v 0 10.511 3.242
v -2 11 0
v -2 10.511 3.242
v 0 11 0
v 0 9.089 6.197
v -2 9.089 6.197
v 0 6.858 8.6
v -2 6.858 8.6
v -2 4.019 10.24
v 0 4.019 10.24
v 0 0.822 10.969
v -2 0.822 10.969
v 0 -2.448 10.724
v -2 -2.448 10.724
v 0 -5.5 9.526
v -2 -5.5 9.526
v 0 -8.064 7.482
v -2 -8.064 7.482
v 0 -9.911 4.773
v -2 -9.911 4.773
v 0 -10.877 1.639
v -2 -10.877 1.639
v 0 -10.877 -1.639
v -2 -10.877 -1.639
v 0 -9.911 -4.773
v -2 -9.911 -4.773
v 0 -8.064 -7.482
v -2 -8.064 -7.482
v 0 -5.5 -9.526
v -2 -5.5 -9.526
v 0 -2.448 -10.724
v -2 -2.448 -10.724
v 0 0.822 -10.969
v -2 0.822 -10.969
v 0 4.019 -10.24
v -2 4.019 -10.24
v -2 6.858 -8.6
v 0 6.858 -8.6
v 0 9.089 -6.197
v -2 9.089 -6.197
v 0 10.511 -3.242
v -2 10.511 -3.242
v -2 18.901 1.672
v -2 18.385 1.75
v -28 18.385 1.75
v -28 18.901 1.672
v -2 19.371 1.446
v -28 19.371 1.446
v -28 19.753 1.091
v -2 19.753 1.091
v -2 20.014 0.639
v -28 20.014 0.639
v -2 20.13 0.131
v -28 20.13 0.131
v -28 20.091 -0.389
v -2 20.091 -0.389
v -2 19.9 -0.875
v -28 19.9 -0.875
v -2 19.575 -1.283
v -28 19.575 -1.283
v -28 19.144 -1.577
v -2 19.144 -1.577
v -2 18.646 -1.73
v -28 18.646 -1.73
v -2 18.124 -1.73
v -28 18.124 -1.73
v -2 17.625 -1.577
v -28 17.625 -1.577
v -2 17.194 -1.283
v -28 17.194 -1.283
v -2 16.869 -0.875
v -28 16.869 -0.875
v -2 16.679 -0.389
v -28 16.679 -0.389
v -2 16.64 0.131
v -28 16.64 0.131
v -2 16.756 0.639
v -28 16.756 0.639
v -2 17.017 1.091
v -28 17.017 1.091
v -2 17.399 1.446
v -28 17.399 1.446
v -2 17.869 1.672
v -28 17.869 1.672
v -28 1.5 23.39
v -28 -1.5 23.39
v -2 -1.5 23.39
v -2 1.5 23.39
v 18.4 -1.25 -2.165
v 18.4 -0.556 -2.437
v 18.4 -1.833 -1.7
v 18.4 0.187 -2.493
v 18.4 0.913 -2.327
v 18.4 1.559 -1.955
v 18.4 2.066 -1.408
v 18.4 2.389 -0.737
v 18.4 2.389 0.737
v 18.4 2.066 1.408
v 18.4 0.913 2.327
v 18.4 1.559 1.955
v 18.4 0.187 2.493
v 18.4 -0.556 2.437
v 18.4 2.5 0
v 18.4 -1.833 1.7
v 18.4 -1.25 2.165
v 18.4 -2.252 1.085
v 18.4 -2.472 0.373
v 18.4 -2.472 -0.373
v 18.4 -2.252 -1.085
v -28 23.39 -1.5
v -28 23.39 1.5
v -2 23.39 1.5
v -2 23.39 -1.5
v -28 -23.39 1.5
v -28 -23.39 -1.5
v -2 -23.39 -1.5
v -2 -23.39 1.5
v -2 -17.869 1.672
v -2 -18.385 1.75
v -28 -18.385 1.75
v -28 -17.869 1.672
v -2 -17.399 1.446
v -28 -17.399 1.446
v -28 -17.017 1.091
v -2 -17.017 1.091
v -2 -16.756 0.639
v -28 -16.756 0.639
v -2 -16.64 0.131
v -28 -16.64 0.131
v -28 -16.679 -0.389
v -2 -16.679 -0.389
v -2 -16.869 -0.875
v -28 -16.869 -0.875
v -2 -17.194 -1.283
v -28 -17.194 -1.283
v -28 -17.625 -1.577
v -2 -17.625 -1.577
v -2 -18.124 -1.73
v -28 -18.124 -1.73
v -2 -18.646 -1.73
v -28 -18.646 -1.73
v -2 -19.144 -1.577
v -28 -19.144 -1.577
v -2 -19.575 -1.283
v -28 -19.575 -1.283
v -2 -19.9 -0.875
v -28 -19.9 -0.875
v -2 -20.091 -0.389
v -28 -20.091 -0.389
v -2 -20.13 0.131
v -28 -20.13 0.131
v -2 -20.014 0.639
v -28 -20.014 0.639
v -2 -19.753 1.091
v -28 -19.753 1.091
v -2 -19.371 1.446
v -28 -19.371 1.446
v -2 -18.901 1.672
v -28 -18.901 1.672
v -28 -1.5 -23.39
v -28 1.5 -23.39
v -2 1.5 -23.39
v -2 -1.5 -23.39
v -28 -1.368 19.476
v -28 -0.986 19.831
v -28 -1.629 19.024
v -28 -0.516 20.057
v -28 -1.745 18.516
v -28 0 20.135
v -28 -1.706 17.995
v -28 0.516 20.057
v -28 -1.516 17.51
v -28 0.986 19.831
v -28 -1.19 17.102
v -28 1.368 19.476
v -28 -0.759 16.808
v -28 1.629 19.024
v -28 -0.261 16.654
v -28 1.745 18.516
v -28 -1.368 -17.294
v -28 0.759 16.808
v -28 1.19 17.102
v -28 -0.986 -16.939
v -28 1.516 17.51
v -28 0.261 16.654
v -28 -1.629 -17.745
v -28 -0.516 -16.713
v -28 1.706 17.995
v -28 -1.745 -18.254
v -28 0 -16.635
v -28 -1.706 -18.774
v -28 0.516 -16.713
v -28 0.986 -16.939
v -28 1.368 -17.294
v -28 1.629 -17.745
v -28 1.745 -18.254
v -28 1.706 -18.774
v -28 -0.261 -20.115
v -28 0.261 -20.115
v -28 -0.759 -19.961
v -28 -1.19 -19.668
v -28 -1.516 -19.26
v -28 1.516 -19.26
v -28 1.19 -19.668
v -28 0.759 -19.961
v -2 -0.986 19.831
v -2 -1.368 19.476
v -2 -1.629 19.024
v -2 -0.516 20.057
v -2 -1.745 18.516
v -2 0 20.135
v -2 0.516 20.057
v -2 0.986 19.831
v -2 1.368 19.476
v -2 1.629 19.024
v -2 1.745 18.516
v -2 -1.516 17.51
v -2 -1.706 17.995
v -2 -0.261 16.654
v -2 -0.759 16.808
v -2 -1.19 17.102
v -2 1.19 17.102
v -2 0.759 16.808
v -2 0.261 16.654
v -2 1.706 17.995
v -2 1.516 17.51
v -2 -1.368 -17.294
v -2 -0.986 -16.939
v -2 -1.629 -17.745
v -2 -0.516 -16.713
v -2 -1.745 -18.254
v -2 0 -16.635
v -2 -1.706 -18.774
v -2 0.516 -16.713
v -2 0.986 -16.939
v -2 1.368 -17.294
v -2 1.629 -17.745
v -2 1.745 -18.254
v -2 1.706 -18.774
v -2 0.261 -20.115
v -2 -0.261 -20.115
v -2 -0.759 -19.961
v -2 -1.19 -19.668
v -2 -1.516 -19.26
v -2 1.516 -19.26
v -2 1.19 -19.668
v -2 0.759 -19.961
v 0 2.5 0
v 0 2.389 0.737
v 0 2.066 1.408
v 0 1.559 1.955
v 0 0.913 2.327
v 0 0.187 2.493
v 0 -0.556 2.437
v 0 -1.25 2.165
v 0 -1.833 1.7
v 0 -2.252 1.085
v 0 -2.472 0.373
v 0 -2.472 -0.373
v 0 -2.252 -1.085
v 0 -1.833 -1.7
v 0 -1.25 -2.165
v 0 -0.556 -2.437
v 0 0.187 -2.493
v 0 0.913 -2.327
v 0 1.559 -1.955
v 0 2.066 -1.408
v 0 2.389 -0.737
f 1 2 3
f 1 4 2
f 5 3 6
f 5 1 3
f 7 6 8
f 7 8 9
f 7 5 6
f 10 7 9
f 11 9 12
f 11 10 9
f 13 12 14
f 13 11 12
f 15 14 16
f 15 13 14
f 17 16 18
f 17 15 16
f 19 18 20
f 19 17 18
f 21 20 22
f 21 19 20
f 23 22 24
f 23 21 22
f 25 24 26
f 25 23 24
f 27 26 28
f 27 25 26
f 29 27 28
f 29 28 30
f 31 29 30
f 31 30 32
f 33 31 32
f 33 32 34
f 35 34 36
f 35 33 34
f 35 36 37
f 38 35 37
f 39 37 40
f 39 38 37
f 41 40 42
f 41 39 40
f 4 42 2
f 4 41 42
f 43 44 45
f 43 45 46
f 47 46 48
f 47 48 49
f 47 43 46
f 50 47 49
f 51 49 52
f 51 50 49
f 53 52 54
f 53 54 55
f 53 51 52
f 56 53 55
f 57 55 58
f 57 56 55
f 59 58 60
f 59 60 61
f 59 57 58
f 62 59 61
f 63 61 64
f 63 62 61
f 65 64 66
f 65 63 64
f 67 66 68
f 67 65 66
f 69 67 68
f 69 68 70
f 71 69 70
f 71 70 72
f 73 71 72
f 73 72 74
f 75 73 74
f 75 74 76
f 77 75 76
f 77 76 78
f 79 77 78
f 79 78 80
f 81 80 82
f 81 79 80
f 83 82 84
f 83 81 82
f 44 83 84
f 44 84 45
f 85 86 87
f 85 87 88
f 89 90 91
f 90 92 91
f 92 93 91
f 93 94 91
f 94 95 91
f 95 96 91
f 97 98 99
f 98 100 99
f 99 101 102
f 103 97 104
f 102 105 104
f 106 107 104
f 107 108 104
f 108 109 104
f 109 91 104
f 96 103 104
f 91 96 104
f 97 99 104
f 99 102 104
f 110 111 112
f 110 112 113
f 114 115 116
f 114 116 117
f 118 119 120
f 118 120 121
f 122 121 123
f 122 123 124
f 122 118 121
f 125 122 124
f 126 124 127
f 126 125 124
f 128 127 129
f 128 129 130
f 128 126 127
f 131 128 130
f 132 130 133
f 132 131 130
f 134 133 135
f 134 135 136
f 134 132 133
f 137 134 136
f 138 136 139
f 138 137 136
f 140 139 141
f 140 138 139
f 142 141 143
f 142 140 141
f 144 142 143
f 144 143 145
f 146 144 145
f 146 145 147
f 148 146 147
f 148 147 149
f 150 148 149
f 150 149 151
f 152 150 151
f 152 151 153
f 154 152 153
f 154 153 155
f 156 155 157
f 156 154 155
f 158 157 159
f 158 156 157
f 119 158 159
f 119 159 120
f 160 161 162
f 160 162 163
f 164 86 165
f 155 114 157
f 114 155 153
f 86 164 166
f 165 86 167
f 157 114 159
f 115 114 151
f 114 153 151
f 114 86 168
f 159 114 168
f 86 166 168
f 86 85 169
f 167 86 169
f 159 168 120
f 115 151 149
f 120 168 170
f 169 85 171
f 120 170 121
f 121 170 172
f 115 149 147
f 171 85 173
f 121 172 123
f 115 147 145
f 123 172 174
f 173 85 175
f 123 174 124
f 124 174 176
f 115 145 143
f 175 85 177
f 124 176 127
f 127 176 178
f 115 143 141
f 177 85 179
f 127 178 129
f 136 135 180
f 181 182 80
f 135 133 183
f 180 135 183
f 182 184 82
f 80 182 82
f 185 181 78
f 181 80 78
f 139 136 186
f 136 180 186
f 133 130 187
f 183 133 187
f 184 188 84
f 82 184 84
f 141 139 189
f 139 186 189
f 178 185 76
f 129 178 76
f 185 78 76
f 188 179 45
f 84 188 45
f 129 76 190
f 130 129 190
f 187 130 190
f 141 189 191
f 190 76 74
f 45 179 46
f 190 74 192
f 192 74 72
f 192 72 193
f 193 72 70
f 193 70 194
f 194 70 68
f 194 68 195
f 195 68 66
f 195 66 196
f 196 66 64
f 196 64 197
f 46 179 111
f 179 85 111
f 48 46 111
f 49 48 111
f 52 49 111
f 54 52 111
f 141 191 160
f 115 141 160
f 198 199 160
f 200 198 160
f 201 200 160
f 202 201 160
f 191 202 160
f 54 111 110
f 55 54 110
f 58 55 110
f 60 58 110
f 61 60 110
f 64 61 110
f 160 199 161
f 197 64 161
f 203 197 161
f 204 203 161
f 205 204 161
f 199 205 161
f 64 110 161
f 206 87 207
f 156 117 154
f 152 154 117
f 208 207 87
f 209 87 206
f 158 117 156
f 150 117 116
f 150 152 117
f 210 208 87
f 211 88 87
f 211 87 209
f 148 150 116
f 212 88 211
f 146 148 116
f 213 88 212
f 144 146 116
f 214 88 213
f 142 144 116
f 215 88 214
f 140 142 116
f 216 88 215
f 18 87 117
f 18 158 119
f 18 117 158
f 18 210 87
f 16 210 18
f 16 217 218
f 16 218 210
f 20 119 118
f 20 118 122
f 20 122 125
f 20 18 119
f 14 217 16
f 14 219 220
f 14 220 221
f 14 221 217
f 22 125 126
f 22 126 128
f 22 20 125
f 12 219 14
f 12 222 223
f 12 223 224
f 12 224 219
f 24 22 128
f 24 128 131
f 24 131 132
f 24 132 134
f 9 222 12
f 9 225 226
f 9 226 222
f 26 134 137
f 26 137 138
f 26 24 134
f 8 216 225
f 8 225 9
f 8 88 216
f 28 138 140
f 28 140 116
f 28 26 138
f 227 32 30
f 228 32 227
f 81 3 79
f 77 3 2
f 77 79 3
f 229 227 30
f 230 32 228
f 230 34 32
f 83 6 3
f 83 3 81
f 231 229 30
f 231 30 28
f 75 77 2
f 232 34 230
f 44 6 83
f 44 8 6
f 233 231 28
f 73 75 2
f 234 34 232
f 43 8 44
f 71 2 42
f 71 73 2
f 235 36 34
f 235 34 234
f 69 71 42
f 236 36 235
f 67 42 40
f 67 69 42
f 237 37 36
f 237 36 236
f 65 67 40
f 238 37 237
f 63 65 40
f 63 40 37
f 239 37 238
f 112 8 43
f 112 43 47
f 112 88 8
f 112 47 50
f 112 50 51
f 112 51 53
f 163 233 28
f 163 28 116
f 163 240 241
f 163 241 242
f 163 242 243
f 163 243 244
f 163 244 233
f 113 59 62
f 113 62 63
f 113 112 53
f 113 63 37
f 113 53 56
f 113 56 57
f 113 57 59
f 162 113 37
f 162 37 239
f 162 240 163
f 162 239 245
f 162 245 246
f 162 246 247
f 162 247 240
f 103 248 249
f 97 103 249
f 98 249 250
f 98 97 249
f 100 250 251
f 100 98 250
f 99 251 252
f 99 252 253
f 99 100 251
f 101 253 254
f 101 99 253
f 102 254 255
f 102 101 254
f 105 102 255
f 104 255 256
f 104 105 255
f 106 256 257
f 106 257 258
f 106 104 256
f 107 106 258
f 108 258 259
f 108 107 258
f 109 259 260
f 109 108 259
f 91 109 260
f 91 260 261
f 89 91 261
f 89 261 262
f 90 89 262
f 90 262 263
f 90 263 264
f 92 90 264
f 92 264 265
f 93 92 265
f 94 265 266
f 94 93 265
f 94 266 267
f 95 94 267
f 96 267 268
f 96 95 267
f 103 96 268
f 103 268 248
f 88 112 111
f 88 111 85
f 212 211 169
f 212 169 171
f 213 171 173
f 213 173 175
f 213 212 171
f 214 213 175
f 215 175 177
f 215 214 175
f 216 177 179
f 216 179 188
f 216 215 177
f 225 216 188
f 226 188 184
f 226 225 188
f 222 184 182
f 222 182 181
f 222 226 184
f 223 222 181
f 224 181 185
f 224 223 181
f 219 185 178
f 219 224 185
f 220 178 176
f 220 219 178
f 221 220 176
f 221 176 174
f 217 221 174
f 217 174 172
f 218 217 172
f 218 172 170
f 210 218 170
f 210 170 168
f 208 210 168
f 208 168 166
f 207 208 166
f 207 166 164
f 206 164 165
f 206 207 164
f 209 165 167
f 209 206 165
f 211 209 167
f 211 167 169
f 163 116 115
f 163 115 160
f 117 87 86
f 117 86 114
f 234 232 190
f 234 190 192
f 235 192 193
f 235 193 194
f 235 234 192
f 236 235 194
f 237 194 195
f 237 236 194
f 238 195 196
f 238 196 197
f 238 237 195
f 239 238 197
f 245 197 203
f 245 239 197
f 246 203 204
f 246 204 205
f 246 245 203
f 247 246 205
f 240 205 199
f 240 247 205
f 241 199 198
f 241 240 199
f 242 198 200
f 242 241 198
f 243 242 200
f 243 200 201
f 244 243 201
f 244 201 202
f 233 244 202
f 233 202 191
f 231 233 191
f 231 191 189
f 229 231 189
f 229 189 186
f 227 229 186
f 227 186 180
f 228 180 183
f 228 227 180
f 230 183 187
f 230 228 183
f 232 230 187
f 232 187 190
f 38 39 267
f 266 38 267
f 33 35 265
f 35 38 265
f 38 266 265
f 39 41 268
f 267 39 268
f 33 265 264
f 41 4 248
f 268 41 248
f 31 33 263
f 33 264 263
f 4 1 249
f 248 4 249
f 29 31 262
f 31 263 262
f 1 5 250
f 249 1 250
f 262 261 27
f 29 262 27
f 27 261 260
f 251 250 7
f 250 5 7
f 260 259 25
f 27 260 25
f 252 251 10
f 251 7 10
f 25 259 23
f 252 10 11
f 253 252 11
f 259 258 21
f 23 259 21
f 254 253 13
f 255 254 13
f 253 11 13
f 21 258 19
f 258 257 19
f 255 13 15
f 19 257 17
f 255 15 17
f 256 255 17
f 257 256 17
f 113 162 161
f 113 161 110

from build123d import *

# Parameters (mm, degrees)
SKETCH2_W           = 18.40000003
SKETCH2_H           = 2.499999953
SKETCH2_W_2         = 2.000000064
SKETCH2_H_2         = 10.999999971
SKETCH3_R           = 1.75
BOSS_EXTRUDE1_DEPTH = 26


with BuildPart() as part:
    # Sketch2 → Revolve1 (revolve)
    with BuildSketch(Plane.XY):
        with Locations((9.200000015, 1.249999977)):
            Rectangle(SKETCH2_W, SKETCH2_H)
        with Locations((-1.000000032, 5.499999986)):
            Rectangle(SKETCH2_W_2, SKETCH2_H_2)
    revolve(axis=Axis((0, 0, 0), (1, 0, 0)))

    # Sketch3 → Boss-Extrude1 (add)
    with BuildSketch(Plane.ZY.offset(2.000000064)):
        Polygon((0, 23.390158698), (1.5, 23.390158698), (23.390158698, 1.5), (23.390158698, 0), (23.390158698, -1.5), (1.5, -23.390158698), (0, -23.390158698), (-1.5, -23.390158698), (-23.390158698, -1.5), (-23.390158698, 0), (-23.390158698, 1.5), (-1.5, 23.390158698), align=None)
        with Locations((0, 18.384776311)):
            Circle(SKETCH3_R, mode=Mode.SUBTRACT)
        with Locations((18.384776311, 0)):
            Circle(SKETCH3_R, mode=Mode.SUBTRACT)
        with Locations((0, -18.384776311)):
            Circle(SKETCH3_R, mode=Mode.SUBTRACT)
        with Locations((-18.384776311, 0)):
            Circle(SKETCH3_R, mode=Mode.SUBTRACT)
    extrude(amount=BOSS_EXTRUDE1_DEPTH)


solid = part.part
